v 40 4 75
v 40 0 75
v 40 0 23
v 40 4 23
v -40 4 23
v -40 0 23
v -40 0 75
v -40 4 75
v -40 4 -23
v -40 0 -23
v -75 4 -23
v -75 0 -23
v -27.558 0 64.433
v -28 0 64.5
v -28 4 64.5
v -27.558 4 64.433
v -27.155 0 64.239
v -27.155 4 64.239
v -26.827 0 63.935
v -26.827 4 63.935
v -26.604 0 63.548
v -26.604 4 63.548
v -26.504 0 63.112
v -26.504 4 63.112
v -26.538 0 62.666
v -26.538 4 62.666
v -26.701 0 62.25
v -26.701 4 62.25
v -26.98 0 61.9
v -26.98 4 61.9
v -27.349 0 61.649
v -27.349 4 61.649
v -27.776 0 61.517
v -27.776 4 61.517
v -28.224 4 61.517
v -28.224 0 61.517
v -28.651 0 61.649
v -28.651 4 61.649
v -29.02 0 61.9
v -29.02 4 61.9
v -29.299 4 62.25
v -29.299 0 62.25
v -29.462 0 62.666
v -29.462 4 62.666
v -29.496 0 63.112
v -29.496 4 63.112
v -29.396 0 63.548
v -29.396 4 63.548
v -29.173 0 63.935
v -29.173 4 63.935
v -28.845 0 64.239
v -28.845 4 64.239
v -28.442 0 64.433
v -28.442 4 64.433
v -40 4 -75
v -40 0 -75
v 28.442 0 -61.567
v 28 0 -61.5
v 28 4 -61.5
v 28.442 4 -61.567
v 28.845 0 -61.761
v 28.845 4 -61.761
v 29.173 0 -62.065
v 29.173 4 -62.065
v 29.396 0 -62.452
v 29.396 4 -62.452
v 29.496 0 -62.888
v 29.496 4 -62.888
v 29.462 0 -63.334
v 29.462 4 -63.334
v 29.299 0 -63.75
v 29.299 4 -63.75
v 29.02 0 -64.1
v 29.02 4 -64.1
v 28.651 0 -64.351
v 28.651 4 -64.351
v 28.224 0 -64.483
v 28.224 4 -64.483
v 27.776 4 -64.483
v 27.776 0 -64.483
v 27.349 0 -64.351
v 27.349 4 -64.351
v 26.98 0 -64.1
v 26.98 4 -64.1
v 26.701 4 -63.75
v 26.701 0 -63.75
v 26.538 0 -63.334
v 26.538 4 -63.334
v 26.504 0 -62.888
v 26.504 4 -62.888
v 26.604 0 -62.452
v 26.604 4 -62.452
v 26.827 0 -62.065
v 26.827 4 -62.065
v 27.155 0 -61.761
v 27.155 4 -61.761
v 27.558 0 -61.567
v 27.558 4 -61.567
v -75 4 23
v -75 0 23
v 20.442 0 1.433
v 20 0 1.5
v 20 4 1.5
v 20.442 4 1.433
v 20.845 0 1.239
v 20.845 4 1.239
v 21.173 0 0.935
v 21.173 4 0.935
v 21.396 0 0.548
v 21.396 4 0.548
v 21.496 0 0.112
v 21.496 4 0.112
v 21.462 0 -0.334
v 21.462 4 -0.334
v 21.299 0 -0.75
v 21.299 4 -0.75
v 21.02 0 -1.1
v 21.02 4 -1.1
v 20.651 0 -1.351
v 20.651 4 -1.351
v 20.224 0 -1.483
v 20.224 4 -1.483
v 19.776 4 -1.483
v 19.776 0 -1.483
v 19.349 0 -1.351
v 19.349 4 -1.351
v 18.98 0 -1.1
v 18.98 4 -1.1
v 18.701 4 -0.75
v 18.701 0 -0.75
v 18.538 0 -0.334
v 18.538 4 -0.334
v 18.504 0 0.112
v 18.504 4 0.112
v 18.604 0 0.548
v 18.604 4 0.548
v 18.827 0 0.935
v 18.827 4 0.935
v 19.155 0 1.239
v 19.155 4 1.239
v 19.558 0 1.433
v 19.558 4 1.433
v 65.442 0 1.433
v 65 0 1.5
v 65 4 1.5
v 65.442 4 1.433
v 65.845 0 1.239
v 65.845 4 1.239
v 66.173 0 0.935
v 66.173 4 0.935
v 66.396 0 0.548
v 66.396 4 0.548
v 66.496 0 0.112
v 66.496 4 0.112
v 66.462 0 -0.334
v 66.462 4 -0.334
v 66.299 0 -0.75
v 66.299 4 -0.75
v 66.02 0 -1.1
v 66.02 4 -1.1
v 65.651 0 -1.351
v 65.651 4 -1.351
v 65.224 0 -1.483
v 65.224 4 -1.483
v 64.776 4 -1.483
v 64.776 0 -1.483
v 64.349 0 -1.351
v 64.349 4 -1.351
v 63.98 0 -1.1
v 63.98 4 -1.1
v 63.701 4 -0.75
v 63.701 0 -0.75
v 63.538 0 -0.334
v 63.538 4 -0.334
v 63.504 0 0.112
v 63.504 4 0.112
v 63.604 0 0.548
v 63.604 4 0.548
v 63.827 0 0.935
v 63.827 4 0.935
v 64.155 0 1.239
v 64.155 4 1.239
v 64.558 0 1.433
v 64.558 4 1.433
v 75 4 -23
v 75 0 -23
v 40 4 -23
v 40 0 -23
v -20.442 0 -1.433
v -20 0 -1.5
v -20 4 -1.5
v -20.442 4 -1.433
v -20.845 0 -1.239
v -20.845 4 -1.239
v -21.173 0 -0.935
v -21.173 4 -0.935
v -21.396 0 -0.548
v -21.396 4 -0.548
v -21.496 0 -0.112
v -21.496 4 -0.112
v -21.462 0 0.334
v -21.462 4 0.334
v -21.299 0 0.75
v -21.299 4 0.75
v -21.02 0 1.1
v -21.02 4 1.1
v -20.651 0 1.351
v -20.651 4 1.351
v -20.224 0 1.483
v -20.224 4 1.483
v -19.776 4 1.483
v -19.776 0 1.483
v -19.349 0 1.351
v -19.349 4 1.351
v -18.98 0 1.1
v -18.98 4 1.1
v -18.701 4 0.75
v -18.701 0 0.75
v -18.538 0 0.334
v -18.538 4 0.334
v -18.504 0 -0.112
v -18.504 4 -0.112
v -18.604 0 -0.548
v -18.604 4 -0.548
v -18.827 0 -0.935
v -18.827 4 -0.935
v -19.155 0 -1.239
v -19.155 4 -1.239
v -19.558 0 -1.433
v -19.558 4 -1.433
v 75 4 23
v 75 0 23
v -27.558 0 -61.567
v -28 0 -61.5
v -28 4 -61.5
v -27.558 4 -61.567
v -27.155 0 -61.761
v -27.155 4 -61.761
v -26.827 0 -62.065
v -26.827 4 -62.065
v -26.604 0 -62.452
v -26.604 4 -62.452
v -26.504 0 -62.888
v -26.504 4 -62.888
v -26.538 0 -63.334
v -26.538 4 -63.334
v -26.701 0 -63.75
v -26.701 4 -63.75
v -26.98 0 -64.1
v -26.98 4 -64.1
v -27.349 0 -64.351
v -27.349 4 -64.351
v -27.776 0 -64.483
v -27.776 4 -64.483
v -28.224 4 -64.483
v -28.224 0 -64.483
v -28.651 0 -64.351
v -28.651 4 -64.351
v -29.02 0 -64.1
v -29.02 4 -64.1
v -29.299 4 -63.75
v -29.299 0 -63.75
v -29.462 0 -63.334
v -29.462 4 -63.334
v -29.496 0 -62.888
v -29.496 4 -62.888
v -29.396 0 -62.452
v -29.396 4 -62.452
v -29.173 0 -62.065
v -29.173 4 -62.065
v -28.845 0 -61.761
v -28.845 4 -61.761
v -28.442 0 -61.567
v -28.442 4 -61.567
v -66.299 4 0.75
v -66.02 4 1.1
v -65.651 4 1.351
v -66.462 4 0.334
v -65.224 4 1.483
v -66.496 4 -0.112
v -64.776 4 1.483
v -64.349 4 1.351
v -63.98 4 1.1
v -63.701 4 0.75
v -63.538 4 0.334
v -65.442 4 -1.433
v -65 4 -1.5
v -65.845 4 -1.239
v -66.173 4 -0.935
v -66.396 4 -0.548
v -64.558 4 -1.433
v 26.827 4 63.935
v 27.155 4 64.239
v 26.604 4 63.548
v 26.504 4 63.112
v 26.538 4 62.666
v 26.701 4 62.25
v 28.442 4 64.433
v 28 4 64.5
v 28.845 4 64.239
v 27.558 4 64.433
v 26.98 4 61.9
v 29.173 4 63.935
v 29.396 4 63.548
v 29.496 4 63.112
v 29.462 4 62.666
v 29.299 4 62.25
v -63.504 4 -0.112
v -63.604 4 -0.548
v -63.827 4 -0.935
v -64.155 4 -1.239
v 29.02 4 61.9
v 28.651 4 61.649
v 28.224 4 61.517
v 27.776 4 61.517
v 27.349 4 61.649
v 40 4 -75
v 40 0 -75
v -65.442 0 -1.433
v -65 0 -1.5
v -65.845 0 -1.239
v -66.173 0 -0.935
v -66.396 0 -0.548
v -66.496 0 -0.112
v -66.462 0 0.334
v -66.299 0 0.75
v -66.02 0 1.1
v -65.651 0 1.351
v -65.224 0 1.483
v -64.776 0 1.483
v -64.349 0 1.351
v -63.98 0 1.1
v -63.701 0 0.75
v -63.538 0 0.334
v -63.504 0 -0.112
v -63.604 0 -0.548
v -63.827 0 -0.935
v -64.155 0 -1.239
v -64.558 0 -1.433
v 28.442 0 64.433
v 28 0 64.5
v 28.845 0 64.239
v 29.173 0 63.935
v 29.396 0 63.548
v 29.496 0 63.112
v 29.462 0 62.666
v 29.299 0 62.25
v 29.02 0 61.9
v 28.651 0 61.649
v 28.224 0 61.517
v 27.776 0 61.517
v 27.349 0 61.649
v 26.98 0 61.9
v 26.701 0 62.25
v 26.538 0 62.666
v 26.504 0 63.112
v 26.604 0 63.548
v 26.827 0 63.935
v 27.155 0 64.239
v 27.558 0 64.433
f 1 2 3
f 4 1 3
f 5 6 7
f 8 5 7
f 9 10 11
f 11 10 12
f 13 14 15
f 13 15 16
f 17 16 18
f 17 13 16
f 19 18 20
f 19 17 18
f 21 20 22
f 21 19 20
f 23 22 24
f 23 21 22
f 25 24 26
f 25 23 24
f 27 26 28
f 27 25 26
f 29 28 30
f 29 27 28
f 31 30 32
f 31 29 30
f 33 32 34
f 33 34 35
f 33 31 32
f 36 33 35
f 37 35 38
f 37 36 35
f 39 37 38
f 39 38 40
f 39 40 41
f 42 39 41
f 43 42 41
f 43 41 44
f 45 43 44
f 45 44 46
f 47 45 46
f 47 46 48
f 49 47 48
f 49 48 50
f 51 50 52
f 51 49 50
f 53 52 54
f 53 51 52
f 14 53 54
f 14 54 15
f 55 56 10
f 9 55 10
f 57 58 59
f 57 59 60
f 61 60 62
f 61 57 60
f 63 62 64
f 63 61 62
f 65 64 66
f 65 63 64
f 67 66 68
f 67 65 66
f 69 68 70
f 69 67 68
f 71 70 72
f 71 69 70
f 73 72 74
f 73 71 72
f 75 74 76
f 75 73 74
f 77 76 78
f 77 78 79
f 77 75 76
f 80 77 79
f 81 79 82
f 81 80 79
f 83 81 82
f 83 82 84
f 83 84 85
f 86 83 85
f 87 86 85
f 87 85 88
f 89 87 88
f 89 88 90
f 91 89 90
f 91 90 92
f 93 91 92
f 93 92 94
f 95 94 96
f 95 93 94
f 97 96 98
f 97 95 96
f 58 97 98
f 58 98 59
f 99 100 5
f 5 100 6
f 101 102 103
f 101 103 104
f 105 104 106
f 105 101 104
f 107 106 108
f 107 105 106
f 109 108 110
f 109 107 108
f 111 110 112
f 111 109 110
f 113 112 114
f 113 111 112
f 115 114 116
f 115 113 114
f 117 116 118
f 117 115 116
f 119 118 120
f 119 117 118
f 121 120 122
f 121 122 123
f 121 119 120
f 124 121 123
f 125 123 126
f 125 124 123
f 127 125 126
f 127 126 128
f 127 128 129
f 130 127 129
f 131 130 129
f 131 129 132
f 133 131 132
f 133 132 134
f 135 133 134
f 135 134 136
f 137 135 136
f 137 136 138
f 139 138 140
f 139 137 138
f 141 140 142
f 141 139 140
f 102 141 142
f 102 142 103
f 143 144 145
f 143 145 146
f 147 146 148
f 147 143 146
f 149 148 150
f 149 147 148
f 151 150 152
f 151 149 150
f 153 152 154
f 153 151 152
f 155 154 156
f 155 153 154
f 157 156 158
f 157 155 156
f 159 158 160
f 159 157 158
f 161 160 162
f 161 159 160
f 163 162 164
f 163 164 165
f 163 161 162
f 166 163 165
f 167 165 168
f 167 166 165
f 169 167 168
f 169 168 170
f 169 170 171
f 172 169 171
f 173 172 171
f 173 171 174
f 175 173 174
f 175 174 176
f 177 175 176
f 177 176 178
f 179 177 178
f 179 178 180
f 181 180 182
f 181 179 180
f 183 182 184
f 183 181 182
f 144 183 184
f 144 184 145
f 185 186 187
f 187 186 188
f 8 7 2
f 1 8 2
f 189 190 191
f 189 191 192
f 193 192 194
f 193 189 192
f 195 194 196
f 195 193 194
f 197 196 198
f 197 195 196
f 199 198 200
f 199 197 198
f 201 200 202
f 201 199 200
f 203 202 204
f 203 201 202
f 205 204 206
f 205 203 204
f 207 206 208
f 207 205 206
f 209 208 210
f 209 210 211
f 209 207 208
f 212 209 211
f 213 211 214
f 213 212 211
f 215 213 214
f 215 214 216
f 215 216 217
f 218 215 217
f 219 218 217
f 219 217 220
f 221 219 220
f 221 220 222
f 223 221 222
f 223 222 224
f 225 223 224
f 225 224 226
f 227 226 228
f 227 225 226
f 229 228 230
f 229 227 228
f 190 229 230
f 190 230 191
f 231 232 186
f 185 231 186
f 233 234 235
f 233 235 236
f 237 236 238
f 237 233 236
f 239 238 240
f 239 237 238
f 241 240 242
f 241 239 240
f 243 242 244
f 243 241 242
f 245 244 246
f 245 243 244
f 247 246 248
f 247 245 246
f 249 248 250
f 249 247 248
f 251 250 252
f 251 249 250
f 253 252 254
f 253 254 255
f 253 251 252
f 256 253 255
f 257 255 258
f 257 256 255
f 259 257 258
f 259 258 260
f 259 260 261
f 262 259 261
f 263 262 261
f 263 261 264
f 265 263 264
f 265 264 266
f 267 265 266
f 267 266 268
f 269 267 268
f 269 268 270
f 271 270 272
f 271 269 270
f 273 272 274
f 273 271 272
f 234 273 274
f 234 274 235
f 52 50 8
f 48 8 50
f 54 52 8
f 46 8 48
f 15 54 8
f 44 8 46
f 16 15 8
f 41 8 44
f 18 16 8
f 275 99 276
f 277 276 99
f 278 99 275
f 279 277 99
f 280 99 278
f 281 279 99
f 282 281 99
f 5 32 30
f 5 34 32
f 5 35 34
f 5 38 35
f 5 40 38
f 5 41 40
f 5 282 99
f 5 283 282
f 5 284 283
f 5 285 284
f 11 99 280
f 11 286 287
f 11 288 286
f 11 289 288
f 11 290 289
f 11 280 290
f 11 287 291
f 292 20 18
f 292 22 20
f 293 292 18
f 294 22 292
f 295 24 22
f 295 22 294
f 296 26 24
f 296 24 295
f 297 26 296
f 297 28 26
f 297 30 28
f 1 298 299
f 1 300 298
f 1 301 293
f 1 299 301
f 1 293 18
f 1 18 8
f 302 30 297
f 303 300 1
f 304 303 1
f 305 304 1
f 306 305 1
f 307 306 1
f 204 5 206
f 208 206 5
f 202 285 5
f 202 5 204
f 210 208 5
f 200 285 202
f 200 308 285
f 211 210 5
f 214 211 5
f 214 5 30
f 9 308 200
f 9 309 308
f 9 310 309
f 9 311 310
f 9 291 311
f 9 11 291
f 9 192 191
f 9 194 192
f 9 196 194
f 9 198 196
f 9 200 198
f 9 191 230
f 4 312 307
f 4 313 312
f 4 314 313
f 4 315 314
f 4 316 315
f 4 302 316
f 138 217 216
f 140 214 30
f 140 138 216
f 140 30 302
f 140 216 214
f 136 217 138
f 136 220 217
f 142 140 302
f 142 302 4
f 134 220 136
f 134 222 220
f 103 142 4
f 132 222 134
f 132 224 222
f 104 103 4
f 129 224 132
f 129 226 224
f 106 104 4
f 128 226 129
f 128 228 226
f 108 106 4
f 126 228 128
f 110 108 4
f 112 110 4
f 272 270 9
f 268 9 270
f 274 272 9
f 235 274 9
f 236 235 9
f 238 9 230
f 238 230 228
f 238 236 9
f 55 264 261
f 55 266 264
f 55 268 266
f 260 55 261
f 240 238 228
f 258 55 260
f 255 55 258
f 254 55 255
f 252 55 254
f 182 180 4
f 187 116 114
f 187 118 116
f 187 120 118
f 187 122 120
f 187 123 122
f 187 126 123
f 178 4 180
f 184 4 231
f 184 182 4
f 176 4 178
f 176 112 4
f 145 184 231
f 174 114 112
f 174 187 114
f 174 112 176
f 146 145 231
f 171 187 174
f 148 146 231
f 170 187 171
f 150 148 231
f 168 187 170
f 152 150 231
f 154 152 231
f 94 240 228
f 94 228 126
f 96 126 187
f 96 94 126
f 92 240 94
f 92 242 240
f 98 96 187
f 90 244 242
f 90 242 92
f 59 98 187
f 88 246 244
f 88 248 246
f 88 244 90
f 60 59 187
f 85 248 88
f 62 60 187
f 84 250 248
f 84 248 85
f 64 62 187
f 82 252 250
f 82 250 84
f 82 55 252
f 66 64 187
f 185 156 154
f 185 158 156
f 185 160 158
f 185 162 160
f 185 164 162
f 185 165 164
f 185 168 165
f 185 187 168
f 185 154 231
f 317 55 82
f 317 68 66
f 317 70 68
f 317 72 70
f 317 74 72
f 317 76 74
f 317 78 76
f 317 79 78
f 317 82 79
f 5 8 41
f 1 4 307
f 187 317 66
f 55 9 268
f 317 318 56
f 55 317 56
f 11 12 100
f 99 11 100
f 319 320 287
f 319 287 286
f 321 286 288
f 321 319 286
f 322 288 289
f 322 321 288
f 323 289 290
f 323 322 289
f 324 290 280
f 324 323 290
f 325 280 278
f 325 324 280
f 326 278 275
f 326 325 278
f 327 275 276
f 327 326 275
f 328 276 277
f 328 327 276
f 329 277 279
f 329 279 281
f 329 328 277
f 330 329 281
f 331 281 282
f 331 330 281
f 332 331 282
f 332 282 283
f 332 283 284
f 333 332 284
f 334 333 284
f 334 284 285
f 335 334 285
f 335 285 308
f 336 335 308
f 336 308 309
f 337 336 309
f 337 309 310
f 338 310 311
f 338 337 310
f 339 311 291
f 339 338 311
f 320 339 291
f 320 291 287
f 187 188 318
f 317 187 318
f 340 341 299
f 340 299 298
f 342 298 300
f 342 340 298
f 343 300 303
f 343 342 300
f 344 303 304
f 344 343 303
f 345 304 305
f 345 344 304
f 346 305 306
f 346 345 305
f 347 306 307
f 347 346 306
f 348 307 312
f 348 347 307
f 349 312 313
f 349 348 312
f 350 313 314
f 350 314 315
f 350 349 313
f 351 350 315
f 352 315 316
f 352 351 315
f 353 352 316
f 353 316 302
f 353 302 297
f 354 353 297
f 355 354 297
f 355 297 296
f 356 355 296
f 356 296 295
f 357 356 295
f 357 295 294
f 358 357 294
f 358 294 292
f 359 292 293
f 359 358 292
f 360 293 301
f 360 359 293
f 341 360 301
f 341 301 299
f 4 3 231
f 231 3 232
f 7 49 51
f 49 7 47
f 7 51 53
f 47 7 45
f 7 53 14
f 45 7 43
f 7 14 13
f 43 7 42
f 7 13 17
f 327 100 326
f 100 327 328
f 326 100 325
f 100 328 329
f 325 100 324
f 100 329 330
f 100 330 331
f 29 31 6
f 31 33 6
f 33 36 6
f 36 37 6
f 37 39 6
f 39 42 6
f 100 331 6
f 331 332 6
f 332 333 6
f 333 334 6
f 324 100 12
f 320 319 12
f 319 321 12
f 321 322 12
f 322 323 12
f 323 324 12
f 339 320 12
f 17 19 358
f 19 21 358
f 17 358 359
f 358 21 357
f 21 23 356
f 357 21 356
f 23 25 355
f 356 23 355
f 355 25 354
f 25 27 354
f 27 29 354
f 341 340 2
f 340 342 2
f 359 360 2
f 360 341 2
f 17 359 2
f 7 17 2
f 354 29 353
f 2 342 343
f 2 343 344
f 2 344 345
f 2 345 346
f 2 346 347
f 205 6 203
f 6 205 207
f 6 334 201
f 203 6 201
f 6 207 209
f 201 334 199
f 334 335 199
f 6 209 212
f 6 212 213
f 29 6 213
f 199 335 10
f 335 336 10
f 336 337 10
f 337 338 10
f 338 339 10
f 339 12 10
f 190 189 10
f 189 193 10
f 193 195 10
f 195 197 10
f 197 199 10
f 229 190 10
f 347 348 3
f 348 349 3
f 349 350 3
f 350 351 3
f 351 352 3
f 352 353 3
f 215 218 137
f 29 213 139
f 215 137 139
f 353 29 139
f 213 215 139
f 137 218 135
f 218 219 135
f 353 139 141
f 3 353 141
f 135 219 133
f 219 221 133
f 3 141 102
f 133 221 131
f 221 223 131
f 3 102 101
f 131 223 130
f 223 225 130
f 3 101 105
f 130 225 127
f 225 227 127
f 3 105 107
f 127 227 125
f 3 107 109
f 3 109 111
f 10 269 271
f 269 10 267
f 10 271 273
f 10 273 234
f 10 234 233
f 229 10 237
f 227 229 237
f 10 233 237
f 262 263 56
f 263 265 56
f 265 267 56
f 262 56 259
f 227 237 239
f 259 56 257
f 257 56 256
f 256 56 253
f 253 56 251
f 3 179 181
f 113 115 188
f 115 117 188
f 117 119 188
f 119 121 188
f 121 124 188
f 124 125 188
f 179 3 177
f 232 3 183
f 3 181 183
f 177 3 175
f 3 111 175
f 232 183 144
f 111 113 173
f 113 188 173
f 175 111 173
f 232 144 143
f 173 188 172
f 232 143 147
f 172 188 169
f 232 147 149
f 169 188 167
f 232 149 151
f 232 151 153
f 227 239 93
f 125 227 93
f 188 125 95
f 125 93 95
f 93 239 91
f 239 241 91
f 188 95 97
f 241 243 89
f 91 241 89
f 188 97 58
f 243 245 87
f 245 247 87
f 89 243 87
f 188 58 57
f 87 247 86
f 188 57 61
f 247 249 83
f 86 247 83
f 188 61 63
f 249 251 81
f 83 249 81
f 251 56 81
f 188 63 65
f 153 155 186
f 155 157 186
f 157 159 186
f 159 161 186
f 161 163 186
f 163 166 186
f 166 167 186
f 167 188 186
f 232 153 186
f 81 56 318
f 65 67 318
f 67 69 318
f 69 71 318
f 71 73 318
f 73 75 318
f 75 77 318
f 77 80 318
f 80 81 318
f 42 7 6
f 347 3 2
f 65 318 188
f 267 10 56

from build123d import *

# Parameters (mm, degrees)
SKETCH1_R           = 1.5
BOSS_EXTRUDE1_DEPTH = 4


with BuildPart() as part:
    # Sketch1 → Boss-Extrude1 (new body)
    with BuildSketch(Plane(origin=(0, 0, 0), x_dir=(1, 0, 0), z_dir=(0, 1, 0))):
        Polygon((-75, -23), (-40, -23), (-40, -75), (40, -75), (40, -23), (75, -23), (75, 23), (40, 23), (40, 75), (-40, 75), (-40, 23), (-75, 23), align=None)
        with Locations(Location((20, 0, 0), (0, 0, 270))):
            Circle(SKETCH1_R, mode=Mode.SUBTRACT)
        with Locations(Location((65, 0, 0), (0, 0, 270))):
            Circle(SKETCH1_R, mode=Mode.SUBTRACT)
        with Locations(Location((-65, 0, 0), (0, 0, 90))):
            Circle(SKETCH1_R, mode=Mode.SUBTRACT)
        with Locations(Location((-20, 0, 0), (0, 0, 90))):
            Circle(SKETCH1_R, mode=Mode.SUBTRACT)
        with Locations(Location((-28, 63, 0), (0, 0, 270))):
            Circle(SKETCH1_R, mode=Mode.SUBTRACT)
        with Locations(Location((28, 63, 0), (0, 0, 270))):
            Circle(SKETCH1_R, mode=Mode.SUBTRACT)
        with Locations(Location((28, -63, 0), (0, 0, 270))):
            Circle(SKETCH1_R, mode=Mode.SUBTRACT)
        with Locations(Location((-28, -63, 0), (0, 0, 270))):
            Circle(SKETCH1_R, mode=Mode.SUBTRACT)
    extrude(amount=BOSS_EXTRUDE1_DEPTH)


solid = part.part
